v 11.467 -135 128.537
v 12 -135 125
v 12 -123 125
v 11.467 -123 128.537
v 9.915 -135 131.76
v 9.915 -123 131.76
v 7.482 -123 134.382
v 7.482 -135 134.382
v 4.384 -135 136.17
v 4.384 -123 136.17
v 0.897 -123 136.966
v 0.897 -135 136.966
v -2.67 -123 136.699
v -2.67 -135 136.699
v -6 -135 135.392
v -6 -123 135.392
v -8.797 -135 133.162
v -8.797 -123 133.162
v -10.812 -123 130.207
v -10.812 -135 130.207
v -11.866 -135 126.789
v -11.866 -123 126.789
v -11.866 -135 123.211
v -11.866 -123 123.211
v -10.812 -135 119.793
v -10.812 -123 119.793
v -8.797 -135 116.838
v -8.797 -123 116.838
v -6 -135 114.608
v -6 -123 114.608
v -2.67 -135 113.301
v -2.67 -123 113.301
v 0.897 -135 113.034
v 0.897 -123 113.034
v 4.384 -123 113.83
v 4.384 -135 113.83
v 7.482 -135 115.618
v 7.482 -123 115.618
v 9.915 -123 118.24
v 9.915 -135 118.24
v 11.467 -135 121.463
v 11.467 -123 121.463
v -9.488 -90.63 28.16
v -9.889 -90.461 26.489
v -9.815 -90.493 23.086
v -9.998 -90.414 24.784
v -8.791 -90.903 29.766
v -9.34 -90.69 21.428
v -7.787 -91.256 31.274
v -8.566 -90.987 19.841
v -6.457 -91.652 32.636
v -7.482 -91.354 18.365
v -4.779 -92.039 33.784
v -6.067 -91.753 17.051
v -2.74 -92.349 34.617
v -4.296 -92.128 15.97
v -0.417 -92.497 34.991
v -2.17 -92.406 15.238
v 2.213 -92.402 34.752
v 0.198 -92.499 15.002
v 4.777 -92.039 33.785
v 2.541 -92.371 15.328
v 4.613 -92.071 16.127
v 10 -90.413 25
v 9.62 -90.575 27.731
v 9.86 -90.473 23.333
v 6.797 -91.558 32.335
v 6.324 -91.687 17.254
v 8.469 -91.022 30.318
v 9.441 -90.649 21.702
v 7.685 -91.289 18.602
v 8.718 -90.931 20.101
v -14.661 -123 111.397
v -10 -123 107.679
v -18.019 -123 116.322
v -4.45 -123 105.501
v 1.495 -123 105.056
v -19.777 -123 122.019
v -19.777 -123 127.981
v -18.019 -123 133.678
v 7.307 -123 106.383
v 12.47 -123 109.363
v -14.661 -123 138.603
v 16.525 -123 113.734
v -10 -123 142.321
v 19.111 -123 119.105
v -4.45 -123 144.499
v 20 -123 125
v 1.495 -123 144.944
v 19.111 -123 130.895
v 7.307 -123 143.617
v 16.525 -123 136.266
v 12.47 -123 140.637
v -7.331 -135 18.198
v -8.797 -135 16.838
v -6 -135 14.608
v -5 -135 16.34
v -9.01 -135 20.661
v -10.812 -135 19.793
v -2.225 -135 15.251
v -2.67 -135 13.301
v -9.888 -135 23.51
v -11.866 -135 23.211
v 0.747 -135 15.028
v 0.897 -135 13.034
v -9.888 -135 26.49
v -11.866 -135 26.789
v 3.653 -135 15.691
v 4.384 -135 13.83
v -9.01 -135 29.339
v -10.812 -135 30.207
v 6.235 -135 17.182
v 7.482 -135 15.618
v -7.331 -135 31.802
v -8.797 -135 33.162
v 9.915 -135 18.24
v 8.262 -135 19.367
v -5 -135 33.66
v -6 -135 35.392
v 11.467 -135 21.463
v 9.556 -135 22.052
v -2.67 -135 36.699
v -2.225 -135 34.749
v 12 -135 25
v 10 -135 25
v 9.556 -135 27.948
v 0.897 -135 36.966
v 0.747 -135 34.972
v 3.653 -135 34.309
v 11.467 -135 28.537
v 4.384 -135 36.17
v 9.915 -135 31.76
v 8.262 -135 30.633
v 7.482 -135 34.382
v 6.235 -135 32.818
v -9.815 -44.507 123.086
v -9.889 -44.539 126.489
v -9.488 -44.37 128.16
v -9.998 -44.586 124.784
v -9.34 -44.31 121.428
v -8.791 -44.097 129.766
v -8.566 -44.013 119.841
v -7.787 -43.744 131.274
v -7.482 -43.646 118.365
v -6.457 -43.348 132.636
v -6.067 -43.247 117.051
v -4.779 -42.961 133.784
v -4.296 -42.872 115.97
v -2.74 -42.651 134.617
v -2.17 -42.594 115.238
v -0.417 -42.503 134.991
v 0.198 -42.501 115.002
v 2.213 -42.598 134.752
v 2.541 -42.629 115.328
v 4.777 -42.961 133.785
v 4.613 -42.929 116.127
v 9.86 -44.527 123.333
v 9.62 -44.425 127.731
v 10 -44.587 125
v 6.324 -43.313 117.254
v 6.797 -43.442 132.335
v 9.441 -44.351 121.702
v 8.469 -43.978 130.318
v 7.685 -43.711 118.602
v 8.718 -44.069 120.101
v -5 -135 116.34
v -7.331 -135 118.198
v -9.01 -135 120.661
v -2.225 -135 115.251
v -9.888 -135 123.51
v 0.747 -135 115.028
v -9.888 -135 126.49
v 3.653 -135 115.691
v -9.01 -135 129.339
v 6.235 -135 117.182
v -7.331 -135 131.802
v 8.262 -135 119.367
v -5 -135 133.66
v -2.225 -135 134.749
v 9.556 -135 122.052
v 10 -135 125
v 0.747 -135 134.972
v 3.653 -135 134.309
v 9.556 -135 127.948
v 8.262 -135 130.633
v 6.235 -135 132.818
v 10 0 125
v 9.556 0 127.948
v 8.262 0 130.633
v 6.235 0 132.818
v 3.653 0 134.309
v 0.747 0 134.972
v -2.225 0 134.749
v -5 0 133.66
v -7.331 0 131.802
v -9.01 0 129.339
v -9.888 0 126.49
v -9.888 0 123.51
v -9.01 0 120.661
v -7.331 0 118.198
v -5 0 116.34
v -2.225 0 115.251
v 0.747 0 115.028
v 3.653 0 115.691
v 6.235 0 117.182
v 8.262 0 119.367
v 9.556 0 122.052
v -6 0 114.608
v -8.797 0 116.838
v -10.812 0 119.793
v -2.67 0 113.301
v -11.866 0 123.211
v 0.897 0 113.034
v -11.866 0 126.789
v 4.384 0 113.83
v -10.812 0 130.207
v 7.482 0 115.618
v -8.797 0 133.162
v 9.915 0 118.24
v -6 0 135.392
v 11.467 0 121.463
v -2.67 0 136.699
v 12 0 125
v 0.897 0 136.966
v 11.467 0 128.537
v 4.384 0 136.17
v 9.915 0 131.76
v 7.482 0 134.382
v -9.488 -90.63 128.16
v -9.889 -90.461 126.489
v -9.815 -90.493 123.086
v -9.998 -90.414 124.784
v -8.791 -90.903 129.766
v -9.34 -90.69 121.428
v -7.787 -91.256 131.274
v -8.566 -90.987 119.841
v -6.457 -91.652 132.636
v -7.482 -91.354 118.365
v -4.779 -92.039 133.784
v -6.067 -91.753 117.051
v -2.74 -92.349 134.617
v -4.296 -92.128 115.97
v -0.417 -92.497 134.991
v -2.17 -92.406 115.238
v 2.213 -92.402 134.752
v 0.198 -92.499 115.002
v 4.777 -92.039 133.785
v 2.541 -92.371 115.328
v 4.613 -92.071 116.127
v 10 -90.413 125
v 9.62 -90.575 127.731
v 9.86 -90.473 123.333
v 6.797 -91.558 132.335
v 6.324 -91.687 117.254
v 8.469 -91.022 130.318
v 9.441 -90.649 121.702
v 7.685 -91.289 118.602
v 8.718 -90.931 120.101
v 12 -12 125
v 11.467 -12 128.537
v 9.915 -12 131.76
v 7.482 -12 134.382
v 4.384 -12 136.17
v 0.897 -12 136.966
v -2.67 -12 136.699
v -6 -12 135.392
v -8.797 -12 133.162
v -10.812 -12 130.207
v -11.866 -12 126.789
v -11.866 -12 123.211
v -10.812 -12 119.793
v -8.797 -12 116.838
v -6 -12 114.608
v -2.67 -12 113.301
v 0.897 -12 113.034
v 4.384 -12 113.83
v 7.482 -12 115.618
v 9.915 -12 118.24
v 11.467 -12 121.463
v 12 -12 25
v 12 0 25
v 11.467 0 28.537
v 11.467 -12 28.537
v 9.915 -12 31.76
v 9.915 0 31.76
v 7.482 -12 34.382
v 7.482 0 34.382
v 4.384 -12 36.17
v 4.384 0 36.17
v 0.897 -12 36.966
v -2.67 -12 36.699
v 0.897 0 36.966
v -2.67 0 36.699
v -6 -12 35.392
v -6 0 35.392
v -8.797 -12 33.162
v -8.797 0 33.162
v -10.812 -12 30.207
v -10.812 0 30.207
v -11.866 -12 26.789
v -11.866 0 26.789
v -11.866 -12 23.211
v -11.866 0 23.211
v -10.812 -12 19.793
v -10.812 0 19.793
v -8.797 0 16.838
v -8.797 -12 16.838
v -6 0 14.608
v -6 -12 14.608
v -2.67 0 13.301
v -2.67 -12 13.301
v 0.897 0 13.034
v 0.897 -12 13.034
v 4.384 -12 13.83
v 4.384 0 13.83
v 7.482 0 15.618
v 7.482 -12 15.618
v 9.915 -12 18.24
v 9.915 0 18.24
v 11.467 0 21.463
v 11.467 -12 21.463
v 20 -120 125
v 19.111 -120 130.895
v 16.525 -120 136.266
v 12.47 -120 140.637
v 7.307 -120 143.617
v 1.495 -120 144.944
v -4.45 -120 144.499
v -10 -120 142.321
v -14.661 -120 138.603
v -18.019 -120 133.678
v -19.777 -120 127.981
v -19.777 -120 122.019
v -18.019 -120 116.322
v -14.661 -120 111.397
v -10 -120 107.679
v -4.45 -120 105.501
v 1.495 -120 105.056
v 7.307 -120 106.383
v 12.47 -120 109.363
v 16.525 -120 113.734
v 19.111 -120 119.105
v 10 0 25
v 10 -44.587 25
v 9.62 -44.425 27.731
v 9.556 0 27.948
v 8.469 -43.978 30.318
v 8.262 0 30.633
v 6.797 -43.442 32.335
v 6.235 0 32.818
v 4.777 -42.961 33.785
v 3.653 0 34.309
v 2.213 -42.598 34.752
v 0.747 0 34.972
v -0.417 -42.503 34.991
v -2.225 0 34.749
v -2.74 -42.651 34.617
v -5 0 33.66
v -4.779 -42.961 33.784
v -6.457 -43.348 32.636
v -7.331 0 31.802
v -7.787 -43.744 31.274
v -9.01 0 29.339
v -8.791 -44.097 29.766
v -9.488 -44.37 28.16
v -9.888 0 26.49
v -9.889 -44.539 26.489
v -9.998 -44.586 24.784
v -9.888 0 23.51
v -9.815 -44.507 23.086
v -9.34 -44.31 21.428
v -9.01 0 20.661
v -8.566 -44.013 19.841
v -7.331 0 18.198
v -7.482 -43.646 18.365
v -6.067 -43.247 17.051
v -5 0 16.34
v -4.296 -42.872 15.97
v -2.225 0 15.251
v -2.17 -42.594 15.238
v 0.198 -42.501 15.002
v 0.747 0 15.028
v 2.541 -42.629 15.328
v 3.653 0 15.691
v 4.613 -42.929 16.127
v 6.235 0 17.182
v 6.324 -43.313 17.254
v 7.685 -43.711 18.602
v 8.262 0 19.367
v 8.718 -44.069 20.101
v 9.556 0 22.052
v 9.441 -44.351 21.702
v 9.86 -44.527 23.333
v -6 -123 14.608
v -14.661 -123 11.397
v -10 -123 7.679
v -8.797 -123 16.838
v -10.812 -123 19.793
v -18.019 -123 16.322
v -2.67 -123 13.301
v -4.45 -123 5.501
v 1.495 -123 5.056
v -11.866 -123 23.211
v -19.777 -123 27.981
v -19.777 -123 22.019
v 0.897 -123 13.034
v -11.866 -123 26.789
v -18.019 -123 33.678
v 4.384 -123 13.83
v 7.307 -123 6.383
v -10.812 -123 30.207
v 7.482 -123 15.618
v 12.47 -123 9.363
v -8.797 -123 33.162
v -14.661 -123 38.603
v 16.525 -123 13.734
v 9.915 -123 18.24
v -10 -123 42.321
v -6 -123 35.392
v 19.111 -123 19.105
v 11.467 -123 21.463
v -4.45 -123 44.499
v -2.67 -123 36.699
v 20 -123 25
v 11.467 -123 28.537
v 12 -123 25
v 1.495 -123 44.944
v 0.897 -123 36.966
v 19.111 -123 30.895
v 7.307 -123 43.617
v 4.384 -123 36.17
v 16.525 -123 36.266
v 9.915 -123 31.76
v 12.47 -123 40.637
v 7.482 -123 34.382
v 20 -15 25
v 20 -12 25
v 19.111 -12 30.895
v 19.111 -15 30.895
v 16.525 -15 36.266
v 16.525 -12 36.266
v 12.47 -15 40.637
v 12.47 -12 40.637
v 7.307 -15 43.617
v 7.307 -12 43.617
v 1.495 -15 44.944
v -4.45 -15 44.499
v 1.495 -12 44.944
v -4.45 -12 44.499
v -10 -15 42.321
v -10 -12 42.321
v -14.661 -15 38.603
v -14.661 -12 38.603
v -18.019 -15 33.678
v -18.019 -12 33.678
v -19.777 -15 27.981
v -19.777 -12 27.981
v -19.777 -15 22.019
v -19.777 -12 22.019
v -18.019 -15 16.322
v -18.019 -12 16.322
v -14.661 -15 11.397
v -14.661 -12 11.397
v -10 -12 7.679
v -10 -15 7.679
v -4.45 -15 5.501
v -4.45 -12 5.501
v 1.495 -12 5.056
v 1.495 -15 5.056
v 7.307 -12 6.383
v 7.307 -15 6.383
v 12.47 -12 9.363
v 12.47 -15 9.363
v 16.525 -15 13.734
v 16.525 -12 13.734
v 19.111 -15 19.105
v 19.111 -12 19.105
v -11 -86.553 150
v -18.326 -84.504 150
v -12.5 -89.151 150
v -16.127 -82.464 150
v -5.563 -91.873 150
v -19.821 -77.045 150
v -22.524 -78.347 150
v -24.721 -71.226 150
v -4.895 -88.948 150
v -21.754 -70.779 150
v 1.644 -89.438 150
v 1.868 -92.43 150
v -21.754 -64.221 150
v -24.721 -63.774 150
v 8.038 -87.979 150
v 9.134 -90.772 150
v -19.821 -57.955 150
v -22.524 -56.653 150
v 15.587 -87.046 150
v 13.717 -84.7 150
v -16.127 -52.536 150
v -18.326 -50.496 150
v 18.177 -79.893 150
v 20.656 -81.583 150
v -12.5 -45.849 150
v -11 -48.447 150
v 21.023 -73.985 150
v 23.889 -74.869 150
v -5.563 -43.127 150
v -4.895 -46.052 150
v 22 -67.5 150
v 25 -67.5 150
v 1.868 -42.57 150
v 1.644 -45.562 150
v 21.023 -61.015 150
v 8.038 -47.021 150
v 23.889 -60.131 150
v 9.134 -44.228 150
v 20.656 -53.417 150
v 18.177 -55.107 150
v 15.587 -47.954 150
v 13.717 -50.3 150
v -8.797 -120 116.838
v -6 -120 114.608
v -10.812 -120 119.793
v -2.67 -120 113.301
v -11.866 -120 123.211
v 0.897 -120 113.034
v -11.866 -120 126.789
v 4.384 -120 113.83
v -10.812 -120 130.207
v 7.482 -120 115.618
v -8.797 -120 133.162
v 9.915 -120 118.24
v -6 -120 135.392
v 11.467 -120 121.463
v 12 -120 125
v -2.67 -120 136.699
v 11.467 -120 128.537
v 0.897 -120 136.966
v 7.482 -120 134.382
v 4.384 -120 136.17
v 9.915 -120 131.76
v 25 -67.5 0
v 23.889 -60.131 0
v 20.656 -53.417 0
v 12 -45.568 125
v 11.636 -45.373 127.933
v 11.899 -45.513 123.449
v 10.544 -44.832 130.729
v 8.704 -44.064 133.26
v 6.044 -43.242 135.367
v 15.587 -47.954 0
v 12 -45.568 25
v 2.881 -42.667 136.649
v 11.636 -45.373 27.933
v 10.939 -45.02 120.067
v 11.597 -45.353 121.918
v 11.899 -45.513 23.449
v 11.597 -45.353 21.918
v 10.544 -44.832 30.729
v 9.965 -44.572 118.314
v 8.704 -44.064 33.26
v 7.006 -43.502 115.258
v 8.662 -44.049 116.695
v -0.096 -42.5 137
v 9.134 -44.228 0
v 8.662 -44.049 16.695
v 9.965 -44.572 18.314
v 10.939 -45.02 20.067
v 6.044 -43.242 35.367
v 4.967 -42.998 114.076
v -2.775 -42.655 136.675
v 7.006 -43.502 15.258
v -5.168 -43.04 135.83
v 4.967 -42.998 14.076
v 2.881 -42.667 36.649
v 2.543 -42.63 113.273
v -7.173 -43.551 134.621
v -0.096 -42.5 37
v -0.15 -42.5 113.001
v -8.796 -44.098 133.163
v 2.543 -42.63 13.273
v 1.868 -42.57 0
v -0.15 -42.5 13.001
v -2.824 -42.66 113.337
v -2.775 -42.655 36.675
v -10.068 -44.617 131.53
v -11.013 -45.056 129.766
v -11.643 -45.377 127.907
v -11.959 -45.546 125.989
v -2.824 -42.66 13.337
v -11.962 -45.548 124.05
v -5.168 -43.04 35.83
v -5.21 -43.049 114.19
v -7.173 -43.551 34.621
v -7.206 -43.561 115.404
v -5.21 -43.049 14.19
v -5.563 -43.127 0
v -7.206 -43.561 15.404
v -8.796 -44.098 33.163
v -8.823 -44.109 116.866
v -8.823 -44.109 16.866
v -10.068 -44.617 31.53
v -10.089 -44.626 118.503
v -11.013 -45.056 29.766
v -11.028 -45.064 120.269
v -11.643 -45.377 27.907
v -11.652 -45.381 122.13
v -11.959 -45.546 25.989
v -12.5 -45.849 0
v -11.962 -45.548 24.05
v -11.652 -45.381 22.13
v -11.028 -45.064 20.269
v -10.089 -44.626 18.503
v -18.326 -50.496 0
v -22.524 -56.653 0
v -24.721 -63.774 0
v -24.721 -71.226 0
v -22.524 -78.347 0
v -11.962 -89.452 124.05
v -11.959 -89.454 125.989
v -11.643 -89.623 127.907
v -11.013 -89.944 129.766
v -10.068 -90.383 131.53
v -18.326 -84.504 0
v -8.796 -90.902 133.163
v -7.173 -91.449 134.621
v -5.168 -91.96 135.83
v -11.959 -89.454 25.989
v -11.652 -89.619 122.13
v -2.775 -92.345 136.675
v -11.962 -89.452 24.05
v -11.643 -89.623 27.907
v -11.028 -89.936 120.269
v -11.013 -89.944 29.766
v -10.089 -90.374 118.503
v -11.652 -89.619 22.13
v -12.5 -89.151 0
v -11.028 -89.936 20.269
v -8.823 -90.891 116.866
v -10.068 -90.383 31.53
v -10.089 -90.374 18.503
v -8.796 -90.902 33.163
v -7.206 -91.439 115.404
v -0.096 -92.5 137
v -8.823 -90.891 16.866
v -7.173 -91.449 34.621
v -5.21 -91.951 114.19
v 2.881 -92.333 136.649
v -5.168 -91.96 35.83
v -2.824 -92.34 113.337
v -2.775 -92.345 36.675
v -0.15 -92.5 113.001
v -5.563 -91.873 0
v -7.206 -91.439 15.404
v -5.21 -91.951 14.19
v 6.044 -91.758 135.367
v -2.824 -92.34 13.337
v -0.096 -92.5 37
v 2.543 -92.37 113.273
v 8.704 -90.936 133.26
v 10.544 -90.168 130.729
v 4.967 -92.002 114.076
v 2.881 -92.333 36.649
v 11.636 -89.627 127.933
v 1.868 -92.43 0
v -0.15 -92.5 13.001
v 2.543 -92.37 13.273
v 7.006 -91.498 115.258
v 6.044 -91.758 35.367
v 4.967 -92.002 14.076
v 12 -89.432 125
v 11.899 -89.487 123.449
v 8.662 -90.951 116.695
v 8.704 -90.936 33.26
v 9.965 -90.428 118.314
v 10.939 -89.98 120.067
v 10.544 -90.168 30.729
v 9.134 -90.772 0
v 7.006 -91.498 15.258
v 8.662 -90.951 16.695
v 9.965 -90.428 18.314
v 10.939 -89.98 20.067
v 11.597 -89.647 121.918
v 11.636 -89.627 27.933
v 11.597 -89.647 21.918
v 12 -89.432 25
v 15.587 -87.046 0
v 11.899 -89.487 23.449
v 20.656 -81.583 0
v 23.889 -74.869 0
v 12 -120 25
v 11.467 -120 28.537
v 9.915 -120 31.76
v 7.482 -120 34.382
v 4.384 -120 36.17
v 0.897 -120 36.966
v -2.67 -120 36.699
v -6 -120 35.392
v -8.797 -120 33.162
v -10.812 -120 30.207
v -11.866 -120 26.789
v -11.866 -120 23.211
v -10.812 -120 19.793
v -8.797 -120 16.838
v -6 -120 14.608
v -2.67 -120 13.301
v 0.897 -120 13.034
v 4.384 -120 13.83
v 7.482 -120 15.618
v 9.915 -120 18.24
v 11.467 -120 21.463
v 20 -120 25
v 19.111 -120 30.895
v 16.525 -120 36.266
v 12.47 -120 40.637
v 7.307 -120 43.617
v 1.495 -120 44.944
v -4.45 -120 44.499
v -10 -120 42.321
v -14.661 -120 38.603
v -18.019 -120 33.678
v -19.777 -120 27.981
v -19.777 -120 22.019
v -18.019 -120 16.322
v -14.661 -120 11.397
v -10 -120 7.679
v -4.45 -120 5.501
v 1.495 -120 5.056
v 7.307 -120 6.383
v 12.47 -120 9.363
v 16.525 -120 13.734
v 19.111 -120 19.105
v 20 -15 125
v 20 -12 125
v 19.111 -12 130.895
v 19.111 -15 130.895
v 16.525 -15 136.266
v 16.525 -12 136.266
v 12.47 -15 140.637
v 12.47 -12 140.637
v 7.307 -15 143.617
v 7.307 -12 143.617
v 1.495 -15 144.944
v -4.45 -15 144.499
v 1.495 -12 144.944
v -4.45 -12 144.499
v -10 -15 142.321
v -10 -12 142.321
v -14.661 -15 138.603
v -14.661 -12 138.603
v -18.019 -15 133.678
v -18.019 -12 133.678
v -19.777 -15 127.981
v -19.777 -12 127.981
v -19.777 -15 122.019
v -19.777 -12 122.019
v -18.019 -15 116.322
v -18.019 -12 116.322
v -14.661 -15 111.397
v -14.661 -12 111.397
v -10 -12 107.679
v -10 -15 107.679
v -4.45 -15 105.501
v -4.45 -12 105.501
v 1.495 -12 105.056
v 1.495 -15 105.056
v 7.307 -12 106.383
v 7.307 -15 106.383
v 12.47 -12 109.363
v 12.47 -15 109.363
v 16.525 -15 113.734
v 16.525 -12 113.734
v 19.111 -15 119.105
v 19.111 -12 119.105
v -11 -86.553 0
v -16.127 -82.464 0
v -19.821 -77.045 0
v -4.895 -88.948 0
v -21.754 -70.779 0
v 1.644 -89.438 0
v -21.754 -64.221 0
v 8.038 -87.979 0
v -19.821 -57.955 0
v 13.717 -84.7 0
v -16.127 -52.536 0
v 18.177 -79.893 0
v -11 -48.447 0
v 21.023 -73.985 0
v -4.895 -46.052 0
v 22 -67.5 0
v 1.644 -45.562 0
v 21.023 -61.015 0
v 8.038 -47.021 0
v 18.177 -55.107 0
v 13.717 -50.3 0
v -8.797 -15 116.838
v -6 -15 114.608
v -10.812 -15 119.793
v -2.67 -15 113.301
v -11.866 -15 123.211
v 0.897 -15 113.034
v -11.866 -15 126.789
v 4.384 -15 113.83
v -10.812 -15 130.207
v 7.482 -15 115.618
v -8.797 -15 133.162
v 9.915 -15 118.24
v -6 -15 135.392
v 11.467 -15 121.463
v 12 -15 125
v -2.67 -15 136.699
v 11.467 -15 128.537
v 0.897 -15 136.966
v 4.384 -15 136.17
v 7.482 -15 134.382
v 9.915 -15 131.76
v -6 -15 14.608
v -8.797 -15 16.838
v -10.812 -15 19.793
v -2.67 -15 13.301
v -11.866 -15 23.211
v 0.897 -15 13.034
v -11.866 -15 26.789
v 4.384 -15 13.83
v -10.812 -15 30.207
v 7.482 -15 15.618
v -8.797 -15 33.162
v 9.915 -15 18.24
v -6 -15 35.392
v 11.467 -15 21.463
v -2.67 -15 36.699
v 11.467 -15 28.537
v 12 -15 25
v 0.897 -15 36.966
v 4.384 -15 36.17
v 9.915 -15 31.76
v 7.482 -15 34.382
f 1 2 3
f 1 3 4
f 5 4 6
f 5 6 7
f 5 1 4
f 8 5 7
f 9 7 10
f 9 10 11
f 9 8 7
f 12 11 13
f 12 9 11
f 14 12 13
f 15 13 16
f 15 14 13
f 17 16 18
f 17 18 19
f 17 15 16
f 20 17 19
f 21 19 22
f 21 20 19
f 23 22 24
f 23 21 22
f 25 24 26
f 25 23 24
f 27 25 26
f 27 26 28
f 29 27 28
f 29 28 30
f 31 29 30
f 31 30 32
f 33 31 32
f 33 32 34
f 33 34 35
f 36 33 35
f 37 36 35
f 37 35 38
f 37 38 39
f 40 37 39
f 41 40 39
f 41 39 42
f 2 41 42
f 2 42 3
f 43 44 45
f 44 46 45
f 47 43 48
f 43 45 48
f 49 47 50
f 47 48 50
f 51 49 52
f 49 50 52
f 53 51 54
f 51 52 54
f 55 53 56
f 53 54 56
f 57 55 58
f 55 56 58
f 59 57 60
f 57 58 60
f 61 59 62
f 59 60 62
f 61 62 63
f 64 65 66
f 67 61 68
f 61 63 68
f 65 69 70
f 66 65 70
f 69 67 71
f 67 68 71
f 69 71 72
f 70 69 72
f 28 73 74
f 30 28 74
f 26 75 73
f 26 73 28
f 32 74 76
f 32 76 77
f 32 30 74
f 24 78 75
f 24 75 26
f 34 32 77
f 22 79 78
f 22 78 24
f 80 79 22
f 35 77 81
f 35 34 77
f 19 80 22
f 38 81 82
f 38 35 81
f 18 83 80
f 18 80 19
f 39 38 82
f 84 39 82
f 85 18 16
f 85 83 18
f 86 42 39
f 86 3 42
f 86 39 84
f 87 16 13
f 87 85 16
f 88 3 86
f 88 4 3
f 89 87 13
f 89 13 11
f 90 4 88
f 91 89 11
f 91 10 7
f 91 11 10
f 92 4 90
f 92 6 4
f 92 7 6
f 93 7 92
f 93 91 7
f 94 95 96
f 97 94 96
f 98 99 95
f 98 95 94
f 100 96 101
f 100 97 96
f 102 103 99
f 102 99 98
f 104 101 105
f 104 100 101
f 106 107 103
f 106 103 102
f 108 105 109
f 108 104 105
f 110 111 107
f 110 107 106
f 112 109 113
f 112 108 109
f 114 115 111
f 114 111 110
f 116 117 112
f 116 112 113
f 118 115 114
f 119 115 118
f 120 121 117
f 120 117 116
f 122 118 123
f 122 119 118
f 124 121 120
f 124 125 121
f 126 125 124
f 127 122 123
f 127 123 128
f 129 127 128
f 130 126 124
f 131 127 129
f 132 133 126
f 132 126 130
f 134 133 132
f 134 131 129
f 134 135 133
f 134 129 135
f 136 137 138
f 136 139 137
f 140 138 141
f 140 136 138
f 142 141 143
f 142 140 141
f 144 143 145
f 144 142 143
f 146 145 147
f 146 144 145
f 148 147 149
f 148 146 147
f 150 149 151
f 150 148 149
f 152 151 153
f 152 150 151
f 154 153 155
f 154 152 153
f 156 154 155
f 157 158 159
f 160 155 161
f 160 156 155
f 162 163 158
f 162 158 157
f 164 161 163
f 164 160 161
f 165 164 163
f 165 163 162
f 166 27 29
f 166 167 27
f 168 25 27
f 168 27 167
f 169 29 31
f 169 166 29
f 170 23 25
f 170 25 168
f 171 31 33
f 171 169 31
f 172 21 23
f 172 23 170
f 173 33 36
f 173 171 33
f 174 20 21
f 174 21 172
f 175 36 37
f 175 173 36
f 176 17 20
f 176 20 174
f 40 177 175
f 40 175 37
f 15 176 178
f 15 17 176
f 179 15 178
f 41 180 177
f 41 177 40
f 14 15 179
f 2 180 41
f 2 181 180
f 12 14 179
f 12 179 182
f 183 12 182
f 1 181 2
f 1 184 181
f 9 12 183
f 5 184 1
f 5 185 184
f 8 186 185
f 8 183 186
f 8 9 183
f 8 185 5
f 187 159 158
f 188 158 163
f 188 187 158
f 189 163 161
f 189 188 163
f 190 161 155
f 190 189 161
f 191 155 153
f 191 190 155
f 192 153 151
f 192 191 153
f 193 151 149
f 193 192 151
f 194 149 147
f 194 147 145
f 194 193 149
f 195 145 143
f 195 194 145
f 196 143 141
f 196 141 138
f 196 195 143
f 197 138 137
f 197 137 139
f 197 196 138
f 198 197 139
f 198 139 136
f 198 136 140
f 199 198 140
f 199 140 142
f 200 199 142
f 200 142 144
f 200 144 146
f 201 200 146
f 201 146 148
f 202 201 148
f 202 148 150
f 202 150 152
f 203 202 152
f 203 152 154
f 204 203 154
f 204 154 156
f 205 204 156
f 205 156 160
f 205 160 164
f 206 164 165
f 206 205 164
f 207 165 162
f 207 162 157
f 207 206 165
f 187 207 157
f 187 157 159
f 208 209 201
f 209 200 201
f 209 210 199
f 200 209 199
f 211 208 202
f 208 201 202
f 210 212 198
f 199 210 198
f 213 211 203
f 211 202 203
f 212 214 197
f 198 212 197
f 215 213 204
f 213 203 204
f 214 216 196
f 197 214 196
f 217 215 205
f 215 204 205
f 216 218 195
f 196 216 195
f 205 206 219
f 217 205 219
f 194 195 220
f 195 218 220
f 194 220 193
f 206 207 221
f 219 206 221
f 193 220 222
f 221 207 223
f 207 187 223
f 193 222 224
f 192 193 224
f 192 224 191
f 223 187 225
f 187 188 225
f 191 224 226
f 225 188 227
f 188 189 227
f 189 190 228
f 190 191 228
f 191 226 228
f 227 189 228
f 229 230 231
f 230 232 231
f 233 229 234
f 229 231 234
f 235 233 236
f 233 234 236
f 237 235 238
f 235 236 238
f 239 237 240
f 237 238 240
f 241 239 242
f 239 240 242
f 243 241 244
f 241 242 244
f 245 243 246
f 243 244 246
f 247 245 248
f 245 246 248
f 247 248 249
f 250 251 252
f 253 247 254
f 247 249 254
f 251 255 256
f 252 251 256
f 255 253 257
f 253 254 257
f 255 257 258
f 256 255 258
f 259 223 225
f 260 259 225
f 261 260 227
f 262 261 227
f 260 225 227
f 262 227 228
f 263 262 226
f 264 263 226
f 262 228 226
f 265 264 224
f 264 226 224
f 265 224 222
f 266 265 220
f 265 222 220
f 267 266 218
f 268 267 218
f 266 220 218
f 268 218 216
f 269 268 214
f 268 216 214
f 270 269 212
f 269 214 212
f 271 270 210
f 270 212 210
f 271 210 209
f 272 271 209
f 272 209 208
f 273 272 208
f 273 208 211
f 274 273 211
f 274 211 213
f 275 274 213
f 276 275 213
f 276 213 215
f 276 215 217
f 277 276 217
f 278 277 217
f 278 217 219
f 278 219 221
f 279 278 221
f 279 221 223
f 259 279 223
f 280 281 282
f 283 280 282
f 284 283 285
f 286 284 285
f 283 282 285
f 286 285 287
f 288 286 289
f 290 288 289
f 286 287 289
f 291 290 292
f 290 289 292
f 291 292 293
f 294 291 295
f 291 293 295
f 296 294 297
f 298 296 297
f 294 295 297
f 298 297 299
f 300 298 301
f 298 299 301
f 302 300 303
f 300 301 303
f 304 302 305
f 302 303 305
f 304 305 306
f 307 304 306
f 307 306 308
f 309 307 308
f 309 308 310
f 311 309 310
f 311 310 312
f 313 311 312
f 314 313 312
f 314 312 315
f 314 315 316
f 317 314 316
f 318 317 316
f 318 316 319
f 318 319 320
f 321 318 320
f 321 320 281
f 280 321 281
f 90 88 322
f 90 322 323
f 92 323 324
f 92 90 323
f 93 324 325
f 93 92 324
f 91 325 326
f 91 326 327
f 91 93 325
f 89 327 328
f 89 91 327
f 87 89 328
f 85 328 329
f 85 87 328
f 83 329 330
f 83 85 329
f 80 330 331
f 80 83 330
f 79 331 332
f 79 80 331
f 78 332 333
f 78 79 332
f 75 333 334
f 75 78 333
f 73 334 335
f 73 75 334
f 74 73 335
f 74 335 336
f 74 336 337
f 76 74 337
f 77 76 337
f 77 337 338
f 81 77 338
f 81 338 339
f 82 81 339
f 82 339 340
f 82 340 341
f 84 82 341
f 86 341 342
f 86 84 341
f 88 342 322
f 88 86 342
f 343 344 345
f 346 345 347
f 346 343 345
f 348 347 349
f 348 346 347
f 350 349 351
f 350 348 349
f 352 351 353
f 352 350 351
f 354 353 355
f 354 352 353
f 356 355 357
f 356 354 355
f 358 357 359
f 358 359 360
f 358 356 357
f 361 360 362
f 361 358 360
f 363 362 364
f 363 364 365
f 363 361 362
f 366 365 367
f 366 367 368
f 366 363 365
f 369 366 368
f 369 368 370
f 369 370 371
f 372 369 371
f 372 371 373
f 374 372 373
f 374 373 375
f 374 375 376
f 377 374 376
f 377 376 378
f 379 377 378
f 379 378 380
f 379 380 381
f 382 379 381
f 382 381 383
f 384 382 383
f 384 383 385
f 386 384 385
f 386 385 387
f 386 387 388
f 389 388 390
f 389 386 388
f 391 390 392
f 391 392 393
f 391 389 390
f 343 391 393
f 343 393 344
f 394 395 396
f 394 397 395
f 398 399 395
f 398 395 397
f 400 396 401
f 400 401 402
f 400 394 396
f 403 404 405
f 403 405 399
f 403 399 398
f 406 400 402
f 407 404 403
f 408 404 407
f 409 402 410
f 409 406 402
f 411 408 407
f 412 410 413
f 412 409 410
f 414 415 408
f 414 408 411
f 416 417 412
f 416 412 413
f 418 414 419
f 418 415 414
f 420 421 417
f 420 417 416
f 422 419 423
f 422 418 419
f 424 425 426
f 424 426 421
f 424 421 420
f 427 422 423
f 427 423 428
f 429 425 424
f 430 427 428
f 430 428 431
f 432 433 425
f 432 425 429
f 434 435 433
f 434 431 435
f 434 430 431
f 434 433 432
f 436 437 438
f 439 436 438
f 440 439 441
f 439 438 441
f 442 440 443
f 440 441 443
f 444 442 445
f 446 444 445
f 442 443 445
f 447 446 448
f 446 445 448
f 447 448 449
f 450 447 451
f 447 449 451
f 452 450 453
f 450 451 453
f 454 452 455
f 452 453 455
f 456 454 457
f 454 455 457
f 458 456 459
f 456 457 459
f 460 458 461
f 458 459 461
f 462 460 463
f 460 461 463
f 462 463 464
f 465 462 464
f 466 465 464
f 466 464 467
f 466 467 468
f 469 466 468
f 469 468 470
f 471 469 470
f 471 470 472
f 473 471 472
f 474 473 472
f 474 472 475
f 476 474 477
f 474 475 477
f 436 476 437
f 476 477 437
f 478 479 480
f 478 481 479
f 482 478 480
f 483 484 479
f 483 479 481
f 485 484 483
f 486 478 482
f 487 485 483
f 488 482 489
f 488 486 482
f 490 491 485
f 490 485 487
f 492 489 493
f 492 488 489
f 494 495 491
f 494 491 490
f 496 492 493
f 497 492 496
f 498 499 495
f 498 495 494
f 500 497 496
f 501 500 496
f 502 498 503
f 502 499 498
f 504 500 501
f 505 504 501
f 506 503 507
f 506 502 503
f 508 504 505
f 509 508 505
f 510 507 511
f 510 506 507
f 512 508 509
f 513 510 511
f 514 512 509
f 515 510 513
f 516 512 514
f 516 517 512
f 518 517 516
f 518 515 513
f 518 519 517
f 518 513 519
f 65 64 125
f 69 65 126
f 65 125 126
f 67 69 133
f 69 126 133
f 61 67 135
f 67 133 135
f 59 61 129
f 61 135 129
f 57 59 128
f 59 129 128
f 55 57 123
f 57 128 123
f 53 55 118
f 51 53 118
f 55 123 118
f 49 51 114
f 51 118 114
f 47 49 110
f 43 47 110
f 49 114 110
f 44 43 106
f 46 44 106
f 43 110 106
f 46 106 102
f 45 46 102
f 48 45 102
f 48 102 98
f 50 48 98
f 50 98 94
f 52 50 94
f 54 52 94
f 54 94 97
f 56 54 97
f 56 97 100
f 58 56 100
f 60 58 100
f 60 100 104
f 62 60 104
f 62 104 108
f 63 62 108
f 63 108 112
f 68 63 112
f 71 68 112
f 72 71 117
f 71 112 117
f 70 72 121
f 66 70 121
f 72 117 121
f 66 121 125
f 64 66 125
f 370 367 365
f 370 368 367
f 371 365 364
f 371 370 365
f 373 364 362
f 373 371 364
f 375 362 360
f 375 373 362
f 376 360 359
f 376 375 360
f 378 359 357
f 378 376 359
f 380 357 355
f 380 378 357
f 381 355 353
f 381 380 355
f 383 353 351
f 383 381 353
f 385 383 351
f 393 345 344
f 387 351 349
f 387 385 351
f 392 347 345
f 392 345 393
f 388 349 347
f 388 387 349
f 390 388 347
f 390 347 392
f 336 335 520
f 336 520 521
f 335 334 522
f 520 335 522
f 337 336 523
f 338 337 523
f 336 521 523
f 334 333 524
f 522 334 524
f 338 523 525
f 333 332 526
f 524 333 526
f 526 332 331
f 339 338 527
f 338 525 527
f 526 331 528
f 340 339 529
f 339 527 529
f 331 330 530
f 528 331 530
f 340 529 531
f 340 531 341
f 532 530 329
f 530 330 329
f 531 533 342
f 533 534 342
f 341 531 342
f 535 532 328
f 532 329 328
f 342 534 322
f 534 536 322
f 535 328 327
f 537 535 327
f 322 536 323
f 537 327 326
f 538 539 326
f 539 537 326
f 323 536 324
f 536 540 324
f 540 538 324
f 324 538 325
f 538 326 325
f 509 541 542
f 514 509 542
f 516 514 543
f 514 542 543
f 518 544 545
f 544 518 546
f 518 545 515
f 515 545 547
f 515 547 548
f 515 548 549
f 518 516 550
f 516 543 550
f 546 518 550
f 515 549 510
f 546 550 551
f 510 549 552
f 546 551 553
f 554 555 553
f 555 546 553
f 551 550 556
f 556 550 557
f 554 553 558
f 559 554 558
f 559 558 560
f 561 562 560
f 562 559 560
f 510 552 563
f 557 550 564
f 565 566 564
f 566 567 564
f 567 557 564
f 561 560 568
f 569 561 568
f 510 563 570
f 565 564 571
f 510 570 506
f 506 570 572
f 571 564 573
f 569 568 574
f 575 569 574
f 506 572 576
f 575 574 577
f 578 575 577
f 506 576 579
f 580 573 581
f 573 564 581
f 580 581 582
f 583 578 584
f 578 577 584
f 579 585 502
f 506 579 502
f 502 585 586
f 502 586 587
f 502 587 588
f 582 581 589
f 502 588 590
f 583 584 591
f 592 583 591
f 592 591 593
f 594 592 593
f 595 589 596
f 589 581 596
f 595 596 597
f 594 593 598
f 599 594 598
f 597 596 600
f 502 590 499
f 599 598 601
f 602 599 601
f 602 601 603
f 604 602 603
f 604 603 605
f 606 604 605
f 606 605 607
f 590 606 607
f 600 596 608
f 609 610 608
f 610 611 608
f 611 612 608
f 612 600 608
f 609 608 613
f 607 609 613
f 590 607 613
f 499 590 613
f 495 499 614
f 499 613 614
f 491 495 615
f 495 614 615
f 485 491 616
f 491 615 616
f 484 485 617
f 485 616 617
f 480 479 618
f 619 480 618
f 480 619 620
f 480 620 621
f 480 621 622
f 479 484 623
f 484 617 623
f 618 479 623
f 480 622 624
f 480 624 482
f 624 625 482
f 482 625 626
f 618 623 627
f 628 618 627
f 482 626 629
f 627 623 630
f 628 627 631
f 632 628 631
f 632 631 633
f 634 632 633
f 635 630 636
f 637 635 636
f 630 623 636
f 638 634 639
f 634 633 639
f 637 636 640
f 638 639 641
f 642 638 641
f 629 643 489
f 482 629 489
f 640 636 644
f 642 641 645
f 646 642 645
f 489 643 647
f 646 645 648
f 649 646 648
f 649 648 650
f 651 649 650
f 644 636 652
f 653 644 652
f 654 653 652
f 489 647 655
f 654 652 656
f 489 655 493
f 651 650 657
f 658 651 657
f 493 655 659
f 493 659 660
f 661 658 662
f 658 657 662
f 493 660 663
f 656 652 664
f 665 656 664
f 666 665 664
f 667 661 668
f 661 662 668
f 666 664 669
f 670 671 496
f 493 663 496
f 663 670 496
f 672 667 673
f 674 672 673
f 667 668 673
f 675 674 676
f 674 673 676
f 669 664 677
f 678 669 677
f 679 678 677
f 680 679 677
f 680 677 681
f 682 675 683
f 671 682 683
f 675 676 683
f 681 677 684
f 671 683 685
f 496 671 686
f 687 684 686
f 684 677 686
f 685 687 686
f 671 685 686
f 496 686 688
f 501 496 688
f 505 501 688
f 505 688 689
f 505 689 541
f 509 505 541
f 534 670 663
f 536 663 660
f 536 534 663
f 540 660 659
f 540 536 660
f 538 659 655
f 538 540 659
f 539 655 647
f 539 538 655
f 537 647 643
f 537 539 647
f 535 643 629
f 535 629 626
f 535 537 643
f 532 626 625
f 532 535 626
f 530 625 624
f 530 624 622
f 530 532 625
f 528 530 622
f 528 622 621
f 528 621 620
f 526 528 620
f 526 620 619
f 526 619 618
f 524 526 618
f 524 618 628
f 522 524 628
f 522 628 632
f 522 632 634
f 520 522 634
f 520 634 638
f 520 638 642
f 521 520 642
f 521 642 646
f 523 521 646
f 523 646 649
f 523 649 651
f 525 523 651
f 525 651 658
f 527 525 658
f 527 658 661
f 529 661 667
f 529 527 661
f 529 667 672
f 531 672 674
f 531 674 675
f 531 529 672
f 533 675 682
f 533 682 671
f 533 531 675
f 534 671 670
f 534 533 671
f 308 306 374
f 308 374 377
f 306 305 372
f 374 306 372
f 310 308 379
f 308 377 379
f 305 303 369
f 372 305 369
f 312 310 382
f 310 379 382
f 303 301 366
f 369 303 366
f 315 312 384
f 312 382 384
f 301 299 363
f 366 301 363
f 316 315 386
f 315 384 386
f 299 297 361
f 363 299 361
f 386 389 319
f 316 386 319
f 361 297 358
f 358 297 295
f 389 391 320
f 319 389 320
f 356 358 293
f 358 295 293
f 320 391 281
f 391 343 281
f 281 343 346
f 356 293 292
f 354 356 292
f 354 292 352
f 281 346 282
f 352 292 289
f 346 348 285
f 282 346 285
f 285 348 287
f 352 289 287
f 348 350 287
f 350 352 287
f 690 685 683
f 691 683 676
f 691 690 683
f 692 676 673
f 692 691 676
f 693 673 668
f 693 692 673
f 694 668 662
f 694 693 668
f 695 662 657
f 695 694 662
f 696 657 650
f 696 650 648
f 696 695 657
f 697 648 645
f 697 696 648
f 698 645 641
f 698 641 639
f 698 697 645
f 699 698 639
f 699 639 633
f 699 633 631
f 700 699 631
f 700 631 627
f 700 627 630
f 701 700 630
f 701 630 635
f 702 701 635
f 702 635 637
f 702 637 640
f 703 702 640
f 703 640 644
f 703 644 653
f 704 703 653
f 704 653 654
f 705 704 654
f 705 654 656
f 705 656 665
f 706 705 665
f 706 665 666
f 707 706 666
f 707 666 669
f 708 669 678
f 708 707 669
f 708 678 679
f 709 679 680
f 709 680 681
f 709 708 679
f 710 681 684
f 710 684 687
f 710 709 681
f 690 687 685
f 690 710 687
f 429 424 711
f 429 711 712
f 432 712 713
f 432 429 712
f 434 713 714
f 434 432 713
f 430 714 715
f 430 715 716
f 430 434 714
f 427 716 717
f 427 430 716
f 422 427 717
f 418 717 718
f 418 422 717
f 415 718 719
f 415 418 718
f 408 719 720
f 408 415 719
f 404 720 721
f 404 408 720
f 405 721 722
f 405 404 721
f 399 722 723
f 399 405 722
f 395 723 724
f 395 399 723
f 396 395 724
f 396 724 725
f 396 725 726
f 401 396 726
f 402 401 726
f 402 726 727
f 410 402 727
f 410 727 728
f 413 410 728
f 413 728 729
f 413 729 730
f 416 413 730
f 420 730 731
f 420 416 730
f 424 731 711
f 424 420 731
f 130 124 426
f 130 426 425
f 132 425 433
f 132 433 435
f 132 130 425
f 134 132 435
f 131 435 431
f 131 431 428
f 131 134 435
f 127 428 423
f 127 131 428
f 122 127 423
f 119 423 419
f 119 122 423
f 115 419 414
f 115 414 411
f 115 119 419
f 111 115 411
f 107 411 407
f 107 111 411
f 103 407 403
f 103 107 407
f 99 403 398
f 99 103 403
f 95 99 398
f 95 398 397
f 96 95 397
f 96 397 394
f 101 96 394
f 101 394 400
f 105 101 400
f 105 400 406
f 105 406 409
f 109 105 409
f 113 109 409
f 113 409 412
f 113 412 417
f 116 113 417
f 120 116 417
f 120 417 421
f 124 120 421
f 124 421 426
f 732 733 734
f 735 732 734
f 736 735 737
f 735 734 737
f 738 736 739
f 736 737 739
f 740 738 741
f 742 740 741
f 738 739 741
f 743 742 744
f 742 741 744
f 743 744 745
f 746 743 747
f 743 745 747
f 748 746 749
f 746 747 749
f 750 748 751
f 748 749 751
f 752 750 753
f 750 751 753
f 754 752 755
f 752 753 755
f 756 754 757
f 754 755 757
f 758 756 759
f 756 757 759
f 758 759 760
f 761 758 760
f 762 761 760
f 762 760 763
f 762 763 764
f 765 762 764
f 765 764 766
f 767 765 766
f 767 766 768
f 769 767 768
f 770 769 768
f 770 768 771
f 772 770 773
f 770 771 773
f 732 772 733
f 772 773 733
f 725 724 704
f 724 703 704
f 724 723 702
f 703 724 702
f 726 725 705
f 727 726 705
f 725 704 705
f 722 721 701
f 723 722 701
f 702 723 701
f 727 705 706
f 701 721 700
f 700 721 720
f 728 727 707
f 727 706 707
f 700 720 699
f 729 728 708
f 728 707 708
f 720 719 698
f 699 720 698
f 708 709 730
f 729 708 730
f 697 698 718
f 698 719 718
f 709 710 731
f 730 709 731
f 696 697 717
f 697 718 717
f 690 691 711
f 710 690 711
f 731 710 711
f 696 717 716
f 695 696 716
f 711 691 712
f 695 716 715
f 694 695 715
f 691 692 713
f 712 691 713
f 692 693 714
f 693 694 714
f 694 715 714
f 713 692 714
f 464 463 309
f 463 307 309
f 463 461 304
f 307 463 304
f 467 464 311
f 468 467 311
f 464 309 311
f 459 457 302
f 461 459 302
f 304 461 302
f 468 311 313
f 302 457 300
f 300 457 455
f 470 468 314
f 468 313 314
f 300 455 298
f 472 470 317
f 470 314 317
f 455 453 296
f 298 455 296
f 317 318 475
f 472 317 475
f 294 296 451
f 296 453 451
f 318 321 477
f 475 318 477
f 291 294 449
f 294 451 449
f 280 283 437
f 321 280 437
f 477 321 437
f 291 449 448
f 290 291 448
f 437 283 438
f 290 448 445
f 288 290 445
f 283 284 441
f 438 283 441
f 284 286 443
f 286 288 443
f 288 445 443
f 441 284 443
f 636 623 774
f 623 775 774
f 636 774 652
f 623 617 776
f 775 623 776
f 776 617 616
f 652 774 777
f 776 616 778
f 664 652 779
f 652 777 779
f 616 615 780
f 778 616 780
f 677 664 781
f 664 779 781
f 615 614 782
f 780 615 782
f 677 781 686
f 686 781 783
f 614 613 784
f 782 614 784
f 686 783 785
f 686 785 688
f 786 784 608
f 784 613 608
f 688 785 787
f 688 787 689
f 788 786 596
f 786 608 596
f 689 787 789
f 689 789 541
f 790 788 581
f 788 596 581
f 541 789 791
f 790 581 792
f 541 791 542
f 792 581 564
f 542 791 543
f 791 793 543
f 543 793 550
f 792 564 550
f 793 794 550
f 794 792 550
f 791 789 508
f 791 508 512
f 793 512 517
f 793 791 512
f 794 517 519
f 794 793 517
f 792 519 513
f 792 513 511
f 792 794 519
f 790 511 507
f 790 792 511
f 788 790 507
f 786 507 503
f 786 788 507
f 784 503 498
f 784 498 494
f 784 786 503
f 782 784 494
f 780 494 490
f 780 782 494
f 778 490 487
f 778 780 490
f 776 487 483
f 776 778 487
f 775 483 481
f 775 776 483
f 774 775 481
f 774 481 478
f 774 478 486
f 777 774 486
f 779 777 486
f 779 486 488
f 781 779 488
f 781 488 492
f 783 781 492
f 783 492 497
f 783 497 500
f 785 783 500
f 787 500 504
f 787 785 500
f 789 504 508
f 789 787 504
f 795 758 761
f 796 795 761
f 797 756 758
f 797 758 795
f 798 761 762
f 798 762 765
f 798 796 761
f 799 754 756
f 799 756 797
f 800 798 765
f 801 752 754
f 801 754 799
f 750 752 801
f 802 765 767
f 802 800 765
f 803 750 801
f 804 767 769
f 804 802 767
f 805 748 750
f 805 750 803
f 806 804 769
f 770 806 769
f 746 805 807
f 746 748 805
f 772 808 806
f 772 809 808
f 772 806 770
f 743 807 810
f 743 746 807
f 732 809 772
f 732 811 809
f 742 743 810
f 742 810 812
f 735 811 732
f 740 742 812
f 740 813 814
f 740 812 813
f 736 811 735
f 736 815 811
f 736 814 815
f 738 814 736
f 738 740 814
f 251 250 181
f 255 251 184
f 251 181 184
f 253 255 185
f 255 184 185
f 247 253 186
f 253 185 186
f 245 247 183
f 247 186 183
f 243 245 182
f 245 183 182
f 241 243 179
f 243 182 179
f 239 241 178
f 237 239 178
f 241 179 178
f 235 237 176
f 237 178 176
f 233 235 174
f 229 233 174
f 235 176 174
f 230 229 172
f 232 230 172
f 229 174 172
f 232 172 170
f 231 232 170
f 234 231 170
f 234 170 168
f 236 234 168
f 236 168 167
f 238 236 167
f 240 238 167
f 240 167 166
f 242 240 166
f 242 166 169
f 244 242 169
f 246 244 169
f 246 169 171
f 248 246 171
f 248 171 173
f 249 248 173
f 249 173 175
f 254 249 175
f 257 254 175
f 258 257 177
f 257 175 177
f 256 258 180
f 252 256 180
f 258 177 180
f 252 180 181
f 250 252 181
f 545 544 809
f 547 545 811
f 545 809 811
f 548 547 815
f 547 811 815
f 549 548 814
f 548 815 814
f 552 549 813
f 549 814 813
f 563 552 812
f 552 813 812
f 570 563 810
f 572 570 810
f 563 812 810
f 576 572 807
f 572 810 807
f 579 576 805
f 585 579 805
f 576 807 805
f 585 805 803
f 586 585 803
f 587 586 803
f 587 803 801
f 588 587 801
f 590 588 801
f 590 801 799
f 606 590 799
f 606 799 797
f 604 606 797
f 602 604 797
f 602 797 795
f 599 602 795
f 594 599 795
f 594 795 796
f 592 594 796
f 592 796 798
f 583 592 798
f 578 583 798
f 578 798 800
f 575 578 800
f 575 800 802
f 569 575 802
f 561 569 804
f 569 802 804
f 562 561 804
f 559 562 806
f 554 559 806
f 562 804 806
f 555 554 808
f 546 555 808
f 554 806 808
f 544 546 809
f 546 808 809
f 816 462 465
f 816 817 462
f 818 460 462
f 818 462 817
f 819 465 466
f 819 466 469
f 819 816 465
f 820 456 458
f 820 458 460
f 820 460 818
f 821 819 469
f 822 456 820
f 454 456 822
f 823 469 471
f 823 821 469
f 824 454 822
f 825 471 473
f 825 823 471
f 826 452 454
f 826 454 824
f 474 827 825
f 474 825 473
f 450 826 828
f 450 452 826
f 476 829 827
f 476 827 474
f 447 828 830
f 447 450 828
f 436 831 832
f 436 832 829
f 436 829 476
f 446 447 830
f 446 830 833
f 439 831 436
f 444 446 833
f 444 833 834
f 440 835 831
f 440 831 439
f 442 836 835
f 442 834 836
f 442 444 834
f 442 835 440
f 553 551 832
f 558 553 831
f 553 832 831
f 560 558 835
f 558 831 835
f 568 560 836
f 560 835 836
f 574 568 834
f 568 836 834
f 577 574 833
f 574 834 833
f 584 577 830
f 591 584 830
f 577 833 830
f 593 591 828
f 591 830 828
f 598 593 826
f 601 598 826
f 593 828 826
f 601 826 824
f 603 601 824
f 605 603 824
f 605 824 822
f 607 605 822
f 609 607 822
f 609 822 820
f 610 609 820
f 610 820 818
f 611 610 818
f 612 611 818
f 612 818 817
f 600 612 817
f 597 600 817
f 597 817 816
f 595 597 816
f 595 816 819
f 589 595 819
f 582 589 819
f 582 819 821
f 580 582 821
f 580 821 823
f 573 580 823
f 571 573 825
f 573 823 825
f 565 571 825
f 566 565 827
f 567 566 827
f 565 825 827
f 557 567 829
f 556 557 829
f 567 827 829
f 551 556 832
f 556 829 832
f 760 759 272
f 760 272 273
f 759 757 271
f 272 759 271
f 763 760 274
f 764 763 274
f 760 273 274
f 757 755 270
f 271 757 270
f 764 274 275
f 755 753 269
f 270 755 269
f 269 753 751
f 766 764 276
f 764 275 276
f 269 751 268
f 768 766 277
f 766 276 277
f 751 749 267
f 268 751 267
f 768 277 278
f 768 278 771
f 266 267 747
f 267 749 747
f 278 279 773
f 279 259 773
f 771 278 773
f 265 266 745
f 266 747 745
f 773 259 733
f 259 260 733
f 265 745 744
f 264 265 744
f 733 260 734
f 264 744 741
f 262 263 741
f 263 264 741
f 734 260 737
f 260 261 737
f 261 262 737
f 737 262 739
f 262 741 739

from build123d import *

# Parameters (mm, degrees)
F4_R     = 25
F4_R_2   = 22
F6_DEPTH = 150
F5_R     = 12
F5_R_2   = 10
F8_START = -12
F5_R_3   = 20
F8_DEPTH = 3


with BuildPart() as f6:
    # F4 (on Top) → F6 (new body, through all)
    with BuildSketch(Plane.XY):
        with Locations((0, -67.5)):
            Circle(F4_R)
        with Locations((0, -67.5)):
            Circle(F4_R_2, mode=Mode.SUBTRACT)
    extrude(amount=F6_DEPTH)

    # F5 (on offset) → F7 (join, up to the next surface of F6)
    with BuildSketch(Plane.XZ.offset(135)):
        with Locations((0, 125)):
            Circle(F5_R)
        with Locations((0, 125)):
            Circle(F5_R_2, mode=Mode.SUBTRACT)
        with Locations((0, 25)):
            Circle(F5_R)
        with Locations((0, 25)):
            Circle(F5_R_2, mode=Mode.SUBTRACT)
    extrude(until=Until.NEXT, dir=(0, 1, 0))

    # F5 (on offset) → F8 (join)
    with BuildSketch(Plane.XZ.offset(135).offset(F8_START)):
        with Locations((0, 125)):
            Circle(F5_R_3)
        with Locations((0, 125)):
            Circle(F5_R, mode=Mode.SUBTRACT)
        with Locations((0, 25)):
            Circle(F5_R_3)
        with Locations((0, 25)):
            Circle(F5_R, mode=Mode.SUBTRACT)
    extrude(amount=-F8_DEPTH)

    # F9: F6 across plane


with BuildPart() as f6_1:
    add(f6.part)
    add(f6.part.mirror(Plane.XZ.offset(67.5)))


solid = f6_1.part
